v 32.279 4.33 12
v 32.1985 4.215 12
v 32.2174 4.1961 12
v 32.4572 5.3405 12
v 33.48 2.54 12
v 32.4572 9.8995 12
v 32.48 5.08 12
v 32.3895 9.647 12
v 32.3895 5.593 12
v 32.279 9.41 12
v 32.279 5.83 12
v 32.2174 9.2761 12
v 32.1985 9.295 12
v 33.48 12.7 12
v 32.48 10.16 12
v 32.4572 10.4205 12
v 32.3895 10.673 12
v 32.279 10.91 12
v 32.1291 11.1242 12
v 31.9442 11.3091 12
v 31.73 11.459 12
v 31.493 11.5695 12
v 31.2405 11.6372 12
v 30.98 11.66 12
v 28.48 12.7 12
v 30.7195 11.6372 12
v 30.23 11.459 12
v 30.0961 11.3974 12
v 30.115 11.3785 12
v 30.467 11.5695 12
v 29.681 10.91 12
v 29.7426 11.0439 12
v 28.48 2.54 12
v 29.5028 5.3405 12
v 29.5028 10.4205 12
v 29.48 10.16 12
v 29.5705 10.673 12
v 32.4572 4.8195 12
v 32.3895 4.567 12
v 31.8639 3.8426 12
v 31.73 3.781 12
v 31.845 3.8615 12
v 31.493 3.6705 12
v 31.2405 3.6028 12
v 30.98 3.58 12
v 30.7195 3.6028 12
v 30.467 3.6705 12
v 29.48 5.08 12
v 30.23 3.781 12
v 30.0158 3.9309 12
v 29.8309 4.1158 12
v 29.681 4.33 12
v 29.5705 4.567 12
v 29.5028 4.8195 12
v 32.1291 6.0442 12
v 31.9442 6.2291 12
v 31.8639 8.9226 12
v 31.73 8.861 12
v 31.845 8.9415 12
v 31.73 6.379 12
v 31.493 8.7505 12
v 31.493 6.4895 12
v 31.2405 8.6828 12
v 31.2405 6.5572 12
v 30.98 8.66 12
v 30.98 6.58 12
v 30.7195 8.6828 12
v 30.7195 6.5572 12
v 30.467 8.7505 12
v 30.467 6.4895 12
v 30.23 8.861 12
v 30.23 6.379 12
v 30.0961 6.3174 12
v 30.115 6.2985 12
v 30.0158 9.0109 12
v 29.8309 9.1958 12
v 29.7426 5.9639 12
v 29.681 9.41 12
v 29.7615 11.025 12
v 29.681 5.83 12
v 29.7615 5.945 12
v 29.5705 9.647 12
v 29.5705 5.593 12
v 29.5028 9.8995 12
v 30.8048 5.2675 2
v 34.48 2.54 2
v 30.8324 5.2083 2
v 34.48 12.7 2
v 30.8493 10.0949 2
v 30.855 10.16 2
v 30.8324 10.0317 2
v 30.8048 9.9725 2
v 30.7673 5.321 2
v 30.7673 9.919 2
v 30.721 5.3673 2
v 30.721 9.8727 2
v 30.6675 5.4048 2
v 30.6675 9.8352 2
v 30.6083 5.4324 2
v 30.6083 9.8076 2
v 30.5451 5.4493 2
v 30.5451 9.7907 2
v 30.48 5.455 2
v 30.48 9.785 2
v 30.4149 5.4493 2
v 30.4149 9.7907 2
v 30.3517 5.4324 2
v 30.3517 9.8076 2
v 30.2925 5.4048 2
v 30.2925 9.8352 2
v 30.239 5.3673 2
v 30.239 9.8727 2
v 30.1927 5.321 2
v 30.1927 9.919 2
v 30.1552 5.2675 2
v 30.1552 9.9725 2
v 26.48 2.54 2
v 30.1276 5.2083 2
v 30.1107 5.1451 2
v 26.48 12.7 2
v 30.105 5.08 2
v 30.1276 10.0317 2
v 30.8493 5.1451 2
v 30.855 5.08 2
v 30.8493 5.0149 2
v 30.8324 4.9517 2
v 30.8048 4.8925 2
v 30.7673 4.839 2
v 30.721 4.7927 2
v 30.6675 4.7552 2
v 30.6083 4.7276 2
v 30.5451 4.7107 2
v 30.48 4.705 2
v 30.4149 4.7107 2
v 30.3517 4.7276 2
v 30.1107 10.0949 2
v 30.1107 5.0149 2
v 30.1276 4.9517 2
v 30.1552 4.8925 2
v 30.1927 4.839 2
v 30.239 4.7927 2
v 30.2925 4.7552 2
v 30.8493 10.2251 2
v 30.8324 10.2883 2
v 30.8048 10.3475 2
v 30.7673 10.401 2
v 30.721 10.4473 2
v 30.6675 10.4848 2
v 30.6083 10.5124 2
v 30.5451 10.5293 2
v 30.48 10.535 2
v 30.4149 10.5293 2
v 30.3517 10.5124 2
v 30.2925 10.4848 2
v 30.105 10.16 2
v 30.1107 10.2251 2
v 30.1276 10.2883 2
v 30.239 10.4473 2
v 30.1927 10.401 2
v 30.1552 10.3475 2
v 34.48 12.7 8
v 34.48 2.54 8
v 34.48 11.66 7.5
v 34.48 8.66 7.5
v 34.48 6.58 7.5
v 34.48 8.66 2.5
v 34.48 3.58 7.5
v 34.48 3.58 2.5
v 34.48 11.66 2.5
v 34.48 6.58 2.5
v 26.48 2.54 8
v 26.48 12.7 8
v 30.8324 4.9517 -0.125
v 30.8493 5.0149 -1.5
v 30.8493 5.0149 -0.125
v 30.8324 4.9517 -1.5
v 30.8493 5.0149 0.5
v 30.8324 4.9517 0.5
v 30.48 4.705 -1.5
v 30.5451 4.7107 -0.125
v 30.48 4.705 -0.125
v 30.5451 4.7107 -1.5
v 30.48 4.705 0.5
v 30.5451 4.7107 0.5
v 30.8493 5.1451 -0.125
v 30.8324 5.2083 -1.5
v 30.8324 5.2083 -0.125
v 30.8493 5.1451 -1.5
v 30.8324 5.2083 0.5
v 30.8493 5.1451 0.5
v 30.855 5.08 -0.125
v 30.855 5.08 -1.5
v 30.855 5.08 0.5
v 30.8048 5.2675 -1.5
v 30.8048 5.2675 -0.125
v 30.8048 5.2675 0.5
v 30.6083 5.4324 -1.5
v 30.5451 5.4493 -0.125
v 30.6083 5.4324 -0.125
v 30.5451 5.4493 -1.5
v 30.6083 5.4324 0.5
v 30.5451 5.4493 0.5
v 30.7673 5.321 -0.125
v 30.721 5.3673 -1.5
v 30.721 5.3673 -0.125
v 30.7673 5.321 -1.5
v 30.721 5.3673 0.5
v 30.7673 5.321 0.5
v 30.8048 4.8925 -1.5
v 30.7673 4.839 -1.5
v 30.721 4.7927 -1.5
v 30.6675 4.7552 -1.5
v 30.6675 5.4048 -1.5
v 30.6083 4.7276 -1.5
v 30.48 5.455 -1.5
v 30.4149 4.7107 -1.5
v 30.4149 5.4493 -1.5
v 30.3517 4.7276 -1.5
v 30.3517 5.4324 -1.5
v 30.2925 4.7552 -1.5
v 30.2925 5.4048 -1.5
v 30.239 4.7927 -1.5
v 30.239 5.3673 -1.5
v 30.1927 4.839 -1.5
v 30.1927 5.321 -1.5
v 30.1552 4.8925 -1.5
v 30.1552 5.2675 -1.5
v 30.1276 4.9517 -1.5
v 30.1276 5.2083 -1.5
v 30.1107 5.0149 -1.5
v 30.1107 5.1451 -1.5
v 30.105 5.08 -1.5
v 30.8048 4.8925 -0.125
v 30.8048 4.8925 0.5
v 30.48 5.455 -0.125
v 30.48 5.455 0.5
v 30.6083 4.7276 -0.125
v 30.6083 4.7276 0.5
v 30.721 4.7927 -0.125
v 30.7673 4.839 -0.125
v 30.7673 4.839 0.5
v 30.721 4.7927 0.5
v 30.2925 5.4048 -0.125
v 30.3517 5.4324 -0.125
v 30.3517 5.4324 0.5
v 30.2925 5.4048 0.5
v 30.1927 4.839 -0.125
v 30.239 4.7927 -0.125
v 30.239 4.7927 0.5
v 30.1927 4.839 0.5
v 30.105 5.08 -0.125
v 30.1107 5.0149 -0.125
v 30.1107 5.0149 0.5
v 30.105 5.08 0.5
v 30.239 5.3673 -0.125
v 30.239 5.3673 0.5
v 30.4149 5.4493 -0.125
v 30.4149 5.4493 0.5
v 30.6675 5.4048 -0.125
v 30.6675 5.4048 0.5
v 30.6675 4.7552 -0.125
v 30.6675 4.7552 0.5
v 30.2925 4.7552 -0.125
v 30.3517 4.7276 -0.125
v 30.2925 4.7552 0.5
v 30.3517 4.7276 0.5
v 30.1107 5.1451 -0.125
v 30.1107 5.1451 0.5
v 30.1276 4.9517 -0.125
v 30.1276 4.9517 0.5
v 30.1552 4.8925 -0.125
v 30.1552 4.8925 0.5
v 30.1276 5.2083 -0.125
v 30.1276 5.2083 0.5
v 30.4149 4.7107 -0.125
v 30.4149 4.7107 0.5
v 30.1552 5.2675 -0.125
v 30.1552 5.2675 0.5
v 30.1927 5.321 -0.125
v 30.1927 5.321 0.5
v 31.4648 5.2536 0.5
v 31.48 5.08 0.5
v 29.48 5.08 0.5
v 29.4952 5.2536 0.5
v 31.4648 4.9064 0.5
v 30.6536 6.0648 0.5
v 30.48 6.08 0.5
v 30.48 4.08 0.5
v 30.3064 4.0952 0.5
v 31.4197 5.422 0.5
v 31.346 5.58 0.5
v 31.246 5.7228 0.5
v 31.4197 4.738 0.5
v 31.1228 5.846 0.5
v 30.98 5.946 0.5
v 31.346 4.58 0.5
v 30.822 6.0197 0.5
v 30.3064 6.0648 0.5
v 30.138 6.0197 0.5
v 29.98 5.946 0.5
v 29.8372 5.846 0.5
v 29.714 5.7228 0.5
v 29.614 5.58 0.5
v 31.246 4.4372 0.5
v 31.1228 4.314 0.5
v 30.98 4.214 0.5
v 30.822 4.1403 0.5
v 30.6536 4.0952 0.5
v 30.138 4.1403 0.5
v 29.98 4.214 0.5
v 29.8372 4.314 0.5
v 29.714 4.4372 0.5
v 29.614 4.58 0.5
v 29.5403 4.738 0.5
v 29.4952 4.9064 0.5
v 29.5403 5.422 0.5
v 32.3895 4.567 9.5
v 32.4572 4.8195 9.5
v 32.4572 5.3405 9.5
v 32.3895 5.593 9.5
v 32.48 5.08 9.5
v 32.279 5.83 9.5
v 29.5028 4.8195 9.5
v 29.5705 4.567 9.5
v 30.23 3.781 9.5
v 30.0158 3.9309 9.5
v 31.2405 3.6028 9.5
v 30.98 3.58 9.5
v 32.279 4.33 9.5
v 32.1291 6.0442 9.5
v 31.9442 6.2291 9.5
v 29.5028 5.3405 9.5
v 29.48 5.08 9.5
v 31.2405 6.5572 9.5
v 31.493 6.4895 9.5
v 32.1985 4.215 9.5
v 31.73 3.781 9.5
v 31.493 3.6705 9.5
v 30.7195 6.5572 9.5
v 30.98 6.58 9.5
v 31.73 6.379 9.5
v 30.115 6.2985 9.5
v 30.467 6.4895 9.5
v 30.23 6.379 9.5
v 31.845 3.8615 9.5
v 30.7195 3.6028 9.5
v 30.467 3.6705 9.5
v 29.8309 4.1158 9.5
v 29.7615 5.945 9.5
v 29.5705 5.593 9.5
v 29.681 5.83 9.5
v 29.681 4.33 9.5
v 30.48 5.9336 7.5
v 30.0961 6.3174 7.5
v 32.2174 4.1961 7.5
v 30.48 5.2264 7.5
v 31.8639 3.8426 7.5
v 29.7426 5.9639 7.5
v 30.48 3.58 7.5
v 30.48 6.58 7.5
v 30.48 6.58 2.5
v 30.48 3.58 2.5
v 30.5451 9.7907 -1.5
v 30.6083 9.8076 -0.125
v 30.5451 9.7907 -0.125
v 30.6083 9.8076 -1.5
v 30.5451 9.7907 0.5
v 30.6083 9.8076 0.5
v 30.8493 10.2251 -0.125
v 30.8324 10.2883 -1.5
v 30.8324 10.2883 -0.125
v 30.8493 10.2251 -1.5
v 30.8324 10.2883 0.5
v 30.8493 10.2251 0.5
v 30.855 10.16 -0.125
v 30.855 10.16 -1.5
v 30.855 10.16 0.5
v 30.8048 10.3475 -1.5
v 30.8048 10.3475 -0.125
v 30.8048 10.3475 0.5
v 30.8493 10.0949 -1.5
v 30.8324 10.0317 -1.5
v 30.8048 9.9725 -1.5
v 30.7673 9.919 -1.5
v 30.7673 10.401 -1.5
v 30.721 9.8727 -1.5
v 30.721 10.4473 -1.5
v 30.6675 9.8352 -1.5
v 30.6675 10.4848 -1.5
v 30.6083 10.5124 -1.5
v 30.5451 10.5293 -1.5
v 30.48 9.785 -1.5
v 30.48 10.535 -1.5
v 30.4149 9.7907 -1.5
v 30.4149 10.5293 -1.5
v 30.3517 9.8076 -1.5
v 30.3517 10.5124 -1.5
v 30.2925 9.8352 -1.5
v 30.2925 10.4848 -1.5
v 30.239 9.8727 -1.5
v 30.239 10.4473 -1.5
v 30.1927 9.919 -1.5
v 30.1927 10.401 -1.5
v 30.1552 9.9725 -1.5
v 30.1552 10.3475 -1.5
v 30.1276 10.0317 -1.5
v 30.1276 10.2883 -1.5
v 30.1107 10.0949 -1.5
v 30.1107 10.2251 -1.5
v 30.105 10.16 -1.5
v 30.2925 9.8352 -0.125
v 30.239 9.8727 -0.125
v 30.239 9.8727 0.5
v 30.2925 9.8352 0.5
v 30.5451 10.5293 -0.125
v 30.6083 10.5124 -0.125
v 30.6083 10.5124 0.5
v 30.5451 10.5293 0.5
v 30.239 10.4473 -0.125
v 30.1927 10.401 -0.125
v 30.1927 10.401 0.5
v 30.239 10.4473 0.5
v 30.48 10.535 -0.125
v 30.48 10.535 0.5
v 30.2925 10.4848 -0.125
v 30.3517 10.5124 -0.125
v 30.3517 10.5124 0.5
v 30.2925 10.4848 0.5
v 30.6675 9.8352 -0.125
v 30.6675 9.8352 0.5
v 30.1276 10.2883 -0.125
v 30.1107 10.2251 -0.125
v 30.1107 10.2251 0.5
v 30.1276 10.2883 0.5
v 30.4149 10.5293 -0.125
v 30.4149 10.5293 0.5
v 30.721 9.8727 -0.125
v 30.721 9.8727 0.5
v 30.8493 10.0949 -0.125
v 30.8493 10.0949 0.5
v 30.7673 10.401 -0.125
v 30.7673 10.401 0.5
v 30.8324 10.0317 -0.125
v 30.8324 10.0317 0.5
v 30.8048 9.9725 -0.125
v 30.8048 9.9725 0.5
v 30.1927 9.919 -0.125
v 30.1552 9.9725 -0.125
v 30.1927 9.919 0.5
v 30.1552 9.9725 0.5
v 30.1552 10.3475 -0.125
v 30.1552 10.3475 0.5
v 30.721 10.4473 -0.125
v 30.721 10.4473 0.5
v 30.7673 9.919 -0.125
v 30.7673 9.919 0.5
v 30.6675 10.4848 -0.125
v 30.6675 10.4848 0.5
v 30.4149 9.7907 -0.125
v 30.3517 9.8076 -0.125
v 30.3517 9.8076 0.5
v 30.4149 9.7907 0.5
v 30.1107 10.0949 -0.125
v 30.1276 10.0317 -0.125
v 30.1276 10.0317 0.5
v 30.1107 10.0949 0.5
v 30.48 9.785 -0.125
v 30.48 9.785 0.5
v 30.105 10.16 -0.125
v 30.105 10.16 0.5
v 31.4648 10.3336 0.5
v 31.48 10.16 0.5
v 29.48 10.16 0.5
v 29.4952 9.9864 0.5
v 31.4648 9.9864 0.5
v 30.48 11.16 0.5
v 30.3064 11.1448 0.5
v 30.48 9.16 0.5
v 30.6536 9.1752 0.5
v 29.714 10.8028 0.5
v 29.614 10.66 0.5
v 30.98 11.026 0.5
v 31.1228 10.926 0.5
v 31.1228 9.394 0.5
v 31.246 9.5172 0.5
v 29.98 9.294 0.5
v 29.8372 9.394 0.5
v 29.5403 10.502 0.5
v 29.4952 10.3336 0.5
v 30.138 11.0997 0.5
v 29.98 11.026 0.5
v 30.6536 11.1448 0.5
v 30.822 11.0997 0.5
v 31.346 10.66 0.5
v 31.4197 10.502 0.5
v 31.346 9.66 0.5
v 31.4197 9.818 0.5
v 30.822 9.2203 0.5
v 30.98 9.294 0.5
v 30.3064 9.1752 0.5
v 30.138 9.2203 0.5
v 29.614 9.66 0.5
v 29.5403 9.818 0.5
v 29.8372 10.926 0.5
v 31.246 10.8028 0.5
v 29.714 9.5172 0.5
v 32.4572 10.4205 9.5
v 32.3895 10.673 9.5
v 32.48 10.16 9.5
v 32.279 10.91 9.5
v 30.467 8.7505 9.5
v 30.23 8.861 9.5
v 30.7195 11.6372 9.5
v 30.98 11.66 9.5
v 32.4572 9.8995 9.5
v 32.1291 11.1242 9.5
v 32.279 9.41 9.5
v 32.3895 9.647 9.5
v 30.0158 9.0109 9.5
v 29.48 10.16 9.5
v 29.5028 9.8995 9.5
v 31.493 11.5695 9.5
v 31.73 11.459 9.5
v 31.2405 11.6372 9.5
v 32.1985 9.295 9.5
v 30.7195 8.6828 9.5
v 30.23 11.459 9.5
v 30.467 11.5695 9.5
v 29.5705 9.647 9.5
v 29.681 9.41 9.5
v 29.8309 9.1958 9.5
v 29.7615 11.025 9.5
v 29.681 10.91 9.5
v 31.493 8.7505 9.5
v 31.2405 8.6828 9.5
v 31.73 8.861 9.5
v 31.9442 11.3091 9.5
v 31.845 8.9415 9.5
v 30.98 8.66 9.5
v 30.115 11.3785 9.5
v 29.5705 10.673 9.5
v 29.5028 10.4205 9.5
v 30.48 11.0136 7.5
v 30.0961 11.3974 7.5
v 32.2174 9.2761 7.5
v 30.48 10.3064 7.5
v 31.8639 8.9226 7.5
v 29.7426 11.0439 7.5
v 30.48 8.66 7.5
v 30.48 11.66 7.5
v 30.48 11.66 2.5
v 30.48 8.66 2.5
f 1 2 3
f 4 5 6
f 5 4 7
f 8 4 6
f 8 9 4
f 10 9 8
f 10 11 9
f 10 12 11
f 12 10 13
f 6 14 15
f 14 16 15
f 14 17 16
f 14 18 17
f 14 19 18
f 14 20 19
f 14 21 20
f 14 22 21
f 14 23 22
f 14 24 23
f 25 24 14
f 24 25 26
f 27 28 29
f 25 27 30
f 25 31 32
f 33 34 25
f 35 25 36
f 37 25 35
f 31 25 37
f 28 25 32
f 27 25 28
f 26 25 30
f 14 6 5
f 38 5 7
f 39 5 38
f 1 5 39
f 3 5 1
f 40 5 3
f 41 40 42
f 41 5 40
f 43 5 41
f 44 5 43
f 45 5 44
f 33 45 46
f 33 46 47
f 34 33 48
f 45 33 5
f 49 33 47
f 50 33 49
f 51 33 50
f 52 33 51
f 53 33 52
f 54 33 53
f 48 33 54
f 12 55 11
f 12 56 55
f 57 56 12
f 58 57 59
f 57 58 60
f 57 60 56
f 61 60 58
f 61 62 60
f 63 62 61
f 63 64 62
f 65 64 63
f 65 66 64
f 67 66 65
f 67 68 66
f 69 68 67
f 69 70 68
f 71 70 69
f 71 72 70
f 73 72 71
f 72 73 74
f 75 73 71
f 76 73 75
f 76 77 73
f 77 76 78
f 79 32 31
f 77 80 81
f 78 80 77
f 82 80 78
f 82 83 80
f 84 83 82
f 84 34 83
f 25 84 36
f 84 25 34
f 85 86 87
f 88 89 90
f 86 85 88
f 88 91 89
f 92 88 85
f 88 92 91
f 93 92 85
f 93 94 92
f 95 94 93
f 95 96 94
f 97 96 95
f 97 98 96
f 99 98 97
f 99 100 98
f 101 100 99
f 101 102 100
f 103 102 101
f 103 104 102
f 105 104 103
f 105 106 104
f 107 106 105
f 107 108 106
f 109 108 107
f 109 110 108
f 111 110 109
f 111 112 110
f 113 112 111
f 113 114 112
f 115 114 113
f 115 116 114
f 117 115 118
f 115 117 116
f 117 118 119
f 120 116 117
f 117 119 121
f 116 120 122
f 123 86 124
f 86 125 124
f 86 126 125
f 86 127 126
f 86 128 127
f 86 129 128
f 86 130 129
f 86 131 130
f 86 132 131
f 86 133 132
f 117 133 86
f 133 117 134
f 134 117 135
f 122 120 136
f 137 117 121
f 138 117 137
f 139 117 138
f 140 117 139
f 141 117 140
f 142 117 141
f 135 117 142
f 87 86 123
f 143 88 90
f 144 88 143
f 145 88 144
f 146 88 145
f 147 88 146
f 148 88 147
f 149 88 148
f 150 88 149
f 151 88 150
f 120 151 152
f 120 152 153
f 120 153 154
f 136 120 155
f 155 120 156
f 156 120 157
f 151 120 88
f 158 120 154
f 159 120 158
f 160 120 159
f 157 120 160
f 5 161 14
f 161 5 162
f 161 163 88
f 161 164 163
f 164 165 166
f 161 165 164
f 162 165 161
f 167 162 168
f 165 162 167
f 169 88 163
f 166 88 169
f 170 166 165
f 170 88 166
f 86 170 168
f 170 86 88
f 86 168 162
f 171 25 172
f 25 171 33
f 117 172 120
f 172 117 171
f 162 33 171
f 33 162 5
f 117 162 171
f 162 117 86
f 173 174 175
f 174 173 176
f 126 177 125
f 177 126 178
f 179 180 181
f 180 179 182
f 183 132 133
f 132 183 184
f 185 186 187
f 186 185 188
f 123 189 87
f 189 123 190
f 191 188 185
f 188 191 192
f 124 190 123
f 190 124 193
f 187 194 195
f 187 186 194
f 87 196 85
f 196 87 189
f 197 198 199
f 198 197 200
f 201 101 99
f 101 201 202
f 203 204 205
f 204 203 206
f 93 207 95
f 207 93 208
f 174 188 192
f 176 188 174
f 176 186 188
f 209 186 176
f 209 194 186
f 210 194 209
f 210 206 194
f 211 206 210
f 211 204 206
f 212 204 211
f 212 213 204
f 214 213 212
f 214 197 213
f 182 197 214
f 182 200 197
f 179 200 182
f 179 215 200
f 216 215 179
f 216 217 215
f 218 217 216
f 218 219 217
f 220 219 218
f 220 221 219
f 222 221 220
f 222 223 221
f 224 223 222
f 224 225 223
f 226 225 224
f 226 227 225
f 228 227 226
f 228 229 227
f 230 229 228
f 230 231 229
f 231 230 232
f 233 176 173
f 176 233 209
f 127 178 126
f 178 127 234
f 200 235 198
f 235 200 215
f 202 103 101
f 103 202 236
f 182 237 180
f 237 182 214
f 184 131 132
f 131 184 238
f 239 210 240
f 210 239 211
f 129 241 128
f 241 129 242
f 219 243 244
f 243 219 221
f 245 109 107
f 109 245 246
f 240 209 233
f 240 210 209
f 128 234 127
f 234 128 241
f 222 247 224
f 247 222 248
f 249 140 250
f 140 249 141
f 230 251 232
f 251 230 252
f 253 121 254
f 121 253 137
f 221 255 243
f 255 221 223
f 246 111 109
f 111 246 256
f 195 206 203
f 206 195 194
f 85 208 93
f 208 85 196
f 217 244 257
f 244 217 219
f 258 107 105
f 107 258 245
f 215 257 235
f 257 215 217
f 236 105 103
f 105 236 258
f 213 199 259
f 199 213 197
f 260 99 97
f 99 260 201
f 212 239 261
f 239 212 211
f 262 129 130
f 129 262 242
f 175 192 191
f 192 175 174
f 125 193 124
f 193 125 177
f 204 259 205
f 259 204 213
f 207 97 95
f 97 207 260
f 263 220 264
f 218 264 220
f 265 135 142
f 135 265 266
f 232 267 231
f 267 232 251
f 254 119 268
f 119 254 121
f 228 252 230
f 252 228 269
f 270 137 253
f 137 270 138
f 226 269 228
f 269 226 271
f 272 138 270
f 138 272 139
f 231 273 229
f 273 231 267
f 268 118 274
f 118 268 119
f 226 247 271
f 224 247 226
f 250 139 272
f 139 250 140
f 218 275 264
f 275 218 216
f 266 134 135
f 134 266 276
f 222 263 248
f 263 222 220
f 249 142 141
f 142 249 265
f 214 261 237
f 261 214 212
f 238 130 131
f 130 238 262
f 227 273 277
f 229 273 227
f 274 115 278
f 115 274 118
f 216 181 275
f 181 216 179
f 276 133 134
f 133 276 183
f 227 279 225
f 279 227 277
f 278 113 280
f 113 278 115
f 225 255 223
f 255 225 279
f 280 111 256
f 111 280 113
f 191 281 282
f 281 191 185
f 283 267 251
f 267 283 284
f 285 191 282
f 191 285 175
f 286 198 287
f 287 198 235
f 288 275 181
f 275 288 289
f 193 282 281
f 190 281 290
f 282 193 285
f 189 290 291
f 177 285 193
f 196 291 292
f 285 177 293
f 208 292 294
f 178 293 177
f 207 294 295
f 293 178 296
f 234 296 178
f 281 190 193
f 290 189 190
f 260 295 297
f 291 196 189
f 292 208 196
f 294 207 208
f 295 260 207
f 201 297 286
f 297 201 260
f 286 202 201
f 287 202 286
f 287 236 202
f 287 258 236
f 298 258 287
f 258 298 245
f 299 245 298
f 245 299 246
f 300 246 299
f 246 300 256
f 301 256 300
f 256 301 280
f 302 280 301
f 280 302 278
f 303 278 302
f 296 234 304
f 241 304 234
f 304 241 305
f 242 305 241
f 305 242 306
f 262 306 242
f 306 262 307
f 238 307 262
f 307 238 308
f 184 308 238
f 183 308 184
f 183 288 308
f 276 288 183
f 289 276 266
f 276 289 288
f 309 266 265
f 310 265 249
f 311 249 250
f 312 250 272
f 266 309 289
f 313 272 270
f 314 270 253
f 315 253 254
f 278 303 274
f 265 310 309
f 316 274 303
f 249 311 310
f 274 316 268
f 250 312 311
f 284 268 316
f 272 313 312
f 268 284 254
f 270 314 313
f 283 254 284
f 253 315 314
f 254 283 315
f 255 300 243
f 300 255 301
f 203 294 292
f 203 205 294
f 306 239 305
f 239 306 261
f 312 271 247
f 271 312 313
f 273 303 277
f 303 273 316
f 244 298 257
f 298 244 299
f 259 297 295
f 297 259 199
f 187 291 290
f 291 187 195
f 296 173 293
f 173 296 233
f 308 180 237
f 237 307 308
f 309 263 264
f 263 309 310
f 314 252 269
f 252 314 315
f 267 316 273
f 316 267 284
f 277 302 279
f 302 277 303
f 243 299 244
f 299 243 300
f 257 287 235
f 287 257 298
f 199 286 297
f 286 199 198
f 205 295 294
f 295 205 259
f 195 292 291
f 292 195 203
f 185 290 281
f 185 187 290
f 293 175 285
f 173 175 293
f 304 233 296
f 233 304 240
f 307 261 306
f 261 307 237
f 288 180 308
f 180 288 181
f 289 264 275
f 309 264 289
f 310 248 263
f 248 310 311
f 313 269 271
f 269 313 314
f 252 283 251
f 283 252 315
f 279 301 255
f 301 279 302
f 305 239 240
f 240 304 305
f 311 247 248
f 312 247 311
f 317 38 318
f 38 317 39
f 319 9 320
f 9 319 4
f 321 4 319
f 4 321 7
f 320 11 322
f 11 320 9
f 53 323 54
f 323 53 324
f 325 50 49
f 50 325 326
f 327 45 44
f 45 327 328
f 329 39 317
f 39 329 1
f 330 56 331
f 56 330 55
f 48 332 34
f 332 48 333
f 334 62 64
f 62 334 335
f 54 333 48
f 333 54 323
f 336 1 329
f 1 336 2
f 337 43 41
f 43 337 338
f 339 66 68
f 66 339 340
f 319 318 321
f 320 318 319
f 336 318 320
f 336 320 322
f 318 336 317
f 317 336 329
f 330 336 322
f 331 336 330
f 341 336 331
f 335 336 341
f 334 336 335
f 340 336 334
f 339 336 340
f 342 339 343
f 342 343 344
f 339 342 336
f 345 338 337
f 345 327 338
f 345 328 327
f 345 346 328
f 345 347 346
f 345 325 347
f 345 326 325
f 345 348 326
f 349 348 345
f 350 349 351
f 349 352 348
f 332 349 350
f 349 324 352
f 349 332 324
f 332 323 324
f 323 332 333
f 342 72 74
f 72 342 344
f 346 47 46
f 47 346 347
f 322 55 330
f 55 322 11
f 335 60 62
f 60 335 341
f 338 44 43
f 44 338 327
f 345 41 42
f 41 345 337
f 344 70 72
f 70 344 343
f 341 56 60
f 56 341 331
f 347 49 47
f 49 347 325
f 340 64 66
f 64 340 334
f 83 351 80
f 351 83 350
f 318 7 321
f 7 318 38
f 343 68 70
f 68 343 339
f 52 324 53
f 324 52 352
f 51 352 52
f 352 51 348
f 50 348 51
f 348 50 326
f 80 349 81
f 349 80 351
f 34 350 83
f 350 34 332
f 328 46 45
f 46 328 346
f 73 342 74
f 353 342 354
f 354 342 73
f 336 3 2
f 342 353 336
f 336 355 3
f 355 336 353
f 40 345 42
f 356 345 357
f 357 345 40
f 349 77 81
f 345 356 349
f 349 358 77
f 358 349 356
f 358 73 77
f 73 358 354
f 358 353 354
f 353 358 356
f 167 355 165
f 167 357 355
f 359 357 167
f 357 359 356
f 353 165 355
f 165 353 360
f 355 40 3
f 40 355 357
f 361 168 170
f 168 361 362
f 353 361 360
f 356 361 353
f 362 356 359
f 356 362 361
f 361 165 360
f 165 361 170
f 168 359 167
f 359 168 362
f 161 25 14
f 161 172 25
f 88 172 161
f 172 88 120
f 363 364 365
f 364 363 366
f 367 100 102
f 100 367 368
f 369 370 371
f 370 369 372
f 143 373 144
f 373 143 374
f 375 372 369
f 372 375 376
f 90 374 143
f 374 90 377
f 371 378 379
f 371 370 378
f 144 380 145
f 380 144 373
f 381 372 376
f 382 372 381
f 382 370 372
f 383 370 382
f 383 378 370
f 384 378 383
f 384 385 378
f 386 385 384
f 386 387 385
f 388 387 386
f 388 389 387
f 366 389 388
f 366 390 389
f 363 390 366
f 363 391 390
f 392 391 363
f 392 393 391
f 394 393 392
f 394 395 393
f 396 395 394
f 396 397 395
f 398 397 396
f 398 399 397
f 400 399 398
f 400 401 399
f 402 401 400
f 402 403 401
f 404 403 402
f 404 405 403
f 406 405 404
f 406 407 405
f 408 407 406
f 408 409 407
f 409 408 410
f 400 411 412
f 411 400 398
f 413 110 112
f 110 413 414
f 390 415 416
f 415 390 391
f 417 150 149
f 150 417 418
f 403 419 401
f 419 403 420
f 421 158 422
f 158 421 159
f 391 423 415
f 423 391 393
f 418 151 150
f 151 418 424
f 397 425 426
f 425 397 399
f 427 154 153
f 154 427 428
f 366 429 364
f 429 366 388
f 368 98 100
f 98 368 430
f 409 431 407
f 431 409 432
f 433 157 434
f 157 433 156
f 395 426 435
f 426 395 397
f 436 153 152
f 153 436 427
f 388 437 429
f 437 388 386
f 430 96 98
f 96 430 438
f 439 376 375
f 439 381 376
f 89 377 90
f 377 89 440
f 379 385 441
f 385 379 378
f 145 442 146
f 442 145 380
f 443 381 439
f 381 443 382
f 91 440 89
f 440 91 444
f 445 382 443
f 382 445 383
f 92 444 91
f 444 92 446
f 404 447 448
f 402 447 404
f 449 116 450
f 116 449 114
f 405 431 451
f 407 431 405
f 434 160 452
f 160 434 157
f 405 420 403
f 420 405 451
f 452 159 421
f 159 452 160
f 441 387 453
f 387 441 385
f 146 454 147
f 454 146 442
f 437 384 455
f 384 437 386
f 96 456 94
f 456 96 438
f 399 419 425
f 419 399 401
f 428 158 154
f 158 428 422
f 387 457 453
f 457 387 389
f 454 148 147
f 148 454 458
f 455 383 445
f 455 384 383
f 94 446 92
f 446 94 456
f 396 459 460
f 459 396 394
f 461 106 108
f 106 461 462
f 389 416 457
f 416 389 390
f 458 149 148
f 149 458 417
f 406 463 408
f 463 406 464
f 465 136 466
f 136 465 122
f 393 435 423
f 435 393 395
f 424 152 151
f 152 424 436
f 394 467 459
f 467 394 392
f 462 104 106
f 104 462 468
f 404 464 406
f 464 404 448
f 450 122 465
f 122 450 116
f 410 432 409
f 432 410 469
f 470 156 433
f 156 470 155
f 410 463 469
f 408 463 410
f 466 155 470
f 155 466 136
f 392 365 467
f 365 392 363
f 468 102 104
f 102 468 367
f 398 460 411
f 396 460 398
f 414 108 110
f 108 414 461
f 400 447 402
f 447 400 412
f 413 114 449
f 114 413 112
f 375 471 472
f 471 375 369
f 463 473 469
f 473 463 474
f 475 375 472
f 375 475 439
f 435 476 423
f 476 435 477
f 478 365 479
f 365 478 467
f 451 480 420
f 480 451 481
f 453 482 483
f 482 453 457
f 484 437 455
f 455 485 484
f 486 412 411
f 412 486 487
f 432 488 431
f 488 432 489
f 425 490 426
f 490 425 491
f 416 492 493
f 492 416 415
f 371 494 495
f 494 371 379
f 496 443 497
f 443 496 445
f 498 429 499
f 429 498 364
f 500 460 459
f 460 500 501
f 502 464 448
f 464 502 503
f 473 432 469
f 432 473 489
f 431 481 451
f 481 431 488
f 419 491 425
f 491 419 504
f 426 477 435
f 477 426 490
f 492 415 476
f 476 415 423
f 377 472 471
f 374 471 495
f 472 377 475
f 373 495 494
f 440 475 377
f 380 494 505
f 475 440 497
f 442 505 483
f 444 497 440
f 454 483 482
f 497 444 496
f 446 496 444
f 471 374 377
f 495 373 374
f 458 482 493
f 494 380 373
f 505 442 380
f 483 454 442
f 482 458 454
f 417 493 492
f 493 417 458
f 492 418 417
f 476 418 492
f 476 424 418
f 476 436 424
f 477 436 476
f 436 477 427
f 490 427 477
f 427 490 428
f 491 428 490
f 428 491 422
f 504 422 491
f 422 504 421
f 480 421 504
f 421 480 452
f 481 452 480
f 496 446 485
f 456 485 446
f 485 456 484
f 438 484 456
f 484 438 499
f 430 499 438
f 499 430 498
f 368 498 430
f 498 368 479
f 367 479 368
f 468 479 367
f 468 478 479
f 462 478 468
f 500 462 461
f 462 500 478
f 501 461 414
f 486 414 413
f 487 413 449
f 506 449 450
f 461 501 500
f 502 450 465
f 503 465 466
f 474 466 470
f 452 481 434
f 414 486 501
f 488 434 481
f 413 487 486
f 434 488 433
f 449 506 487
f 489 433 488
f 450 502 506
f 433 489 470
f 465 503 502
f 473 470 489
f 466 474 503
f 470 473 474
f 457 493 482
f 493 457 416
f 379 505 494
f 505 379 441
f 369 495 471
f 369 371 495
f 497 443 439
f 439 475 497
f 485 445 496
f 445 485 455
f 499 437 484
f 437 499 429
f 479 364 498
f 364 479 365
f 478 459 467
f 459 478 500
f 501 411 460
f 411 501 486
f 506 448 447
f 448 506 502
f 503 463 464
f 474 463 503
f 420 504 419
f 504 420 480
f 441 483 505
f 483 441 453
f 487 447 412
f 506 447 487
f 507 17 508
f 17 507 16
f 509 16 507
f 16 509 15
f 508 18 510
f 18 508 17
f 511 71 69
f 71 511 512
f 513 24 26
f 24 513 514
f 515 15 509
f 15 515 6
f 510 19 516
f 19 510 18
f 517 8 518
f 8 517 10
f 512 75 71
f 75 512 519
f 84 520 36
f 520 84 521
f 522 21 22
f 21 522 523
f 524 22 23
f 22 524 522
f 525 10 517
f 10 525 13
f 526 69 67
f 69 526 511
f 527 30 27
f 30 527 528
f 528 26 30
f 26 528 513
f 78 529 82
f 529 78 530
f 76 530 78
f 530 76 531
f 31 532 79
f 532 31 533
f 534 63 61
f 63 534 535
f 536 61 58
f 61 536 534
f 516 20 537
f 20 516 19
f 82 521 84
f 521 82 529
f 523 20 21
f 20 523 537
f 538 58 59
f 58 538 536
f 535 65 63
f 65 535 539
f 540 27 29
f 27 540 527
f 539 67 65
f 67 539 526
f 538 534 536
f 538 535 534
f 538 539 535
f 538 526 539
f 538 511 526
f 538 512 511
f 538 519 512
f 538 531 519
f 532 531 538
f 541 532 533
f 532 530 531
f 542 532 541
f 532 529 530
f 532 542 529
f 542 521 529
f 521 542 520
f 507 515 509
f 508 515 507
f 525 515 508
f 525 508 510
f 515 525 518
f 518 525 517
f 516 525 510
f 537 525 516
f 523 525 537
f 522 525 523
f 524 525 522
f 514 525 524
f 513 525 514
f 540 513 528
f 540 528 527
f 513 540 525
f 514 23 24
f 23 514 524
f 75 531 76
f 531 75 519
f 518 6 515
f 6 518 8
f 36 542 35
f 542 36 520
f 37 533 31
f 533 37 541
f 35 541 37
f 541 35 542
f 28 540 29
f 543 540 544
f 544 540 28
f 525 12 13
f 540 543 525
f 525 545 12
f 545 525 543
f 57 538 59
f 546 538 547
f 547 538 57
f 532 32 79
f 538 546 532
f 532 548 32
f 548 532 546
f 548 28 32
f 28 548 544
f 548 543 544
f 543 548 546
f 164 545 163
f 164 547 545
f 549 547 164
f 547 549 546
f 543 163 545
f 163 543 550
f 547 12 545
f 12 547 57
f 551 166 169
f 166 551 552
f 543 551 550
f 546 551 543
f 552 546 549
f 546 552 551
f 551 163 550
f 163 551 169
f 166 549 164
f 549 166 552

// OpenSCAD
$fn=36;

Terminal_pitch=2.54*2;
Terminal_positions=2;

module Screw_terminal(Pitch,Positions)
  {
    for(a=[0:1:Positions-1])
      {
      difference()
        {
        union()
          {
            color("Slategrey")
            hull()
              {
              translate([0,Pitch*a,3.5])
              cube([8,Pitch,6],center=true);
              translate([0.5,Pitch*a,5.5])
              cube([5,Pitch,10],center=true);
              }
          color("Silver")
          translate([0,Pitch*a,0])
            cylinder(d=0.75,h=6,center=true);

          color("Silver")
            translate([0,Pitch*a,-2])
               cylinder(r1=0,r2=1,h=1);
          }

          color("silver")
          translate([0.5,Pitch*a,11])
            cylinder(d=3,h=6,center=true);
          color("DarkGrey")
          translate([0.5,Pitch*a,11])
            rotate([0,0,45])
            cube([0.5,3,10],center=true);
          translate([4,Pitch*a,3.5])
            cube([8,3,5],center=true);

        }

      }




  }

translate([2.54*12,2.54*2,1.5])
Screw_terminal(Terminal_pitch,Terminal_positions);
